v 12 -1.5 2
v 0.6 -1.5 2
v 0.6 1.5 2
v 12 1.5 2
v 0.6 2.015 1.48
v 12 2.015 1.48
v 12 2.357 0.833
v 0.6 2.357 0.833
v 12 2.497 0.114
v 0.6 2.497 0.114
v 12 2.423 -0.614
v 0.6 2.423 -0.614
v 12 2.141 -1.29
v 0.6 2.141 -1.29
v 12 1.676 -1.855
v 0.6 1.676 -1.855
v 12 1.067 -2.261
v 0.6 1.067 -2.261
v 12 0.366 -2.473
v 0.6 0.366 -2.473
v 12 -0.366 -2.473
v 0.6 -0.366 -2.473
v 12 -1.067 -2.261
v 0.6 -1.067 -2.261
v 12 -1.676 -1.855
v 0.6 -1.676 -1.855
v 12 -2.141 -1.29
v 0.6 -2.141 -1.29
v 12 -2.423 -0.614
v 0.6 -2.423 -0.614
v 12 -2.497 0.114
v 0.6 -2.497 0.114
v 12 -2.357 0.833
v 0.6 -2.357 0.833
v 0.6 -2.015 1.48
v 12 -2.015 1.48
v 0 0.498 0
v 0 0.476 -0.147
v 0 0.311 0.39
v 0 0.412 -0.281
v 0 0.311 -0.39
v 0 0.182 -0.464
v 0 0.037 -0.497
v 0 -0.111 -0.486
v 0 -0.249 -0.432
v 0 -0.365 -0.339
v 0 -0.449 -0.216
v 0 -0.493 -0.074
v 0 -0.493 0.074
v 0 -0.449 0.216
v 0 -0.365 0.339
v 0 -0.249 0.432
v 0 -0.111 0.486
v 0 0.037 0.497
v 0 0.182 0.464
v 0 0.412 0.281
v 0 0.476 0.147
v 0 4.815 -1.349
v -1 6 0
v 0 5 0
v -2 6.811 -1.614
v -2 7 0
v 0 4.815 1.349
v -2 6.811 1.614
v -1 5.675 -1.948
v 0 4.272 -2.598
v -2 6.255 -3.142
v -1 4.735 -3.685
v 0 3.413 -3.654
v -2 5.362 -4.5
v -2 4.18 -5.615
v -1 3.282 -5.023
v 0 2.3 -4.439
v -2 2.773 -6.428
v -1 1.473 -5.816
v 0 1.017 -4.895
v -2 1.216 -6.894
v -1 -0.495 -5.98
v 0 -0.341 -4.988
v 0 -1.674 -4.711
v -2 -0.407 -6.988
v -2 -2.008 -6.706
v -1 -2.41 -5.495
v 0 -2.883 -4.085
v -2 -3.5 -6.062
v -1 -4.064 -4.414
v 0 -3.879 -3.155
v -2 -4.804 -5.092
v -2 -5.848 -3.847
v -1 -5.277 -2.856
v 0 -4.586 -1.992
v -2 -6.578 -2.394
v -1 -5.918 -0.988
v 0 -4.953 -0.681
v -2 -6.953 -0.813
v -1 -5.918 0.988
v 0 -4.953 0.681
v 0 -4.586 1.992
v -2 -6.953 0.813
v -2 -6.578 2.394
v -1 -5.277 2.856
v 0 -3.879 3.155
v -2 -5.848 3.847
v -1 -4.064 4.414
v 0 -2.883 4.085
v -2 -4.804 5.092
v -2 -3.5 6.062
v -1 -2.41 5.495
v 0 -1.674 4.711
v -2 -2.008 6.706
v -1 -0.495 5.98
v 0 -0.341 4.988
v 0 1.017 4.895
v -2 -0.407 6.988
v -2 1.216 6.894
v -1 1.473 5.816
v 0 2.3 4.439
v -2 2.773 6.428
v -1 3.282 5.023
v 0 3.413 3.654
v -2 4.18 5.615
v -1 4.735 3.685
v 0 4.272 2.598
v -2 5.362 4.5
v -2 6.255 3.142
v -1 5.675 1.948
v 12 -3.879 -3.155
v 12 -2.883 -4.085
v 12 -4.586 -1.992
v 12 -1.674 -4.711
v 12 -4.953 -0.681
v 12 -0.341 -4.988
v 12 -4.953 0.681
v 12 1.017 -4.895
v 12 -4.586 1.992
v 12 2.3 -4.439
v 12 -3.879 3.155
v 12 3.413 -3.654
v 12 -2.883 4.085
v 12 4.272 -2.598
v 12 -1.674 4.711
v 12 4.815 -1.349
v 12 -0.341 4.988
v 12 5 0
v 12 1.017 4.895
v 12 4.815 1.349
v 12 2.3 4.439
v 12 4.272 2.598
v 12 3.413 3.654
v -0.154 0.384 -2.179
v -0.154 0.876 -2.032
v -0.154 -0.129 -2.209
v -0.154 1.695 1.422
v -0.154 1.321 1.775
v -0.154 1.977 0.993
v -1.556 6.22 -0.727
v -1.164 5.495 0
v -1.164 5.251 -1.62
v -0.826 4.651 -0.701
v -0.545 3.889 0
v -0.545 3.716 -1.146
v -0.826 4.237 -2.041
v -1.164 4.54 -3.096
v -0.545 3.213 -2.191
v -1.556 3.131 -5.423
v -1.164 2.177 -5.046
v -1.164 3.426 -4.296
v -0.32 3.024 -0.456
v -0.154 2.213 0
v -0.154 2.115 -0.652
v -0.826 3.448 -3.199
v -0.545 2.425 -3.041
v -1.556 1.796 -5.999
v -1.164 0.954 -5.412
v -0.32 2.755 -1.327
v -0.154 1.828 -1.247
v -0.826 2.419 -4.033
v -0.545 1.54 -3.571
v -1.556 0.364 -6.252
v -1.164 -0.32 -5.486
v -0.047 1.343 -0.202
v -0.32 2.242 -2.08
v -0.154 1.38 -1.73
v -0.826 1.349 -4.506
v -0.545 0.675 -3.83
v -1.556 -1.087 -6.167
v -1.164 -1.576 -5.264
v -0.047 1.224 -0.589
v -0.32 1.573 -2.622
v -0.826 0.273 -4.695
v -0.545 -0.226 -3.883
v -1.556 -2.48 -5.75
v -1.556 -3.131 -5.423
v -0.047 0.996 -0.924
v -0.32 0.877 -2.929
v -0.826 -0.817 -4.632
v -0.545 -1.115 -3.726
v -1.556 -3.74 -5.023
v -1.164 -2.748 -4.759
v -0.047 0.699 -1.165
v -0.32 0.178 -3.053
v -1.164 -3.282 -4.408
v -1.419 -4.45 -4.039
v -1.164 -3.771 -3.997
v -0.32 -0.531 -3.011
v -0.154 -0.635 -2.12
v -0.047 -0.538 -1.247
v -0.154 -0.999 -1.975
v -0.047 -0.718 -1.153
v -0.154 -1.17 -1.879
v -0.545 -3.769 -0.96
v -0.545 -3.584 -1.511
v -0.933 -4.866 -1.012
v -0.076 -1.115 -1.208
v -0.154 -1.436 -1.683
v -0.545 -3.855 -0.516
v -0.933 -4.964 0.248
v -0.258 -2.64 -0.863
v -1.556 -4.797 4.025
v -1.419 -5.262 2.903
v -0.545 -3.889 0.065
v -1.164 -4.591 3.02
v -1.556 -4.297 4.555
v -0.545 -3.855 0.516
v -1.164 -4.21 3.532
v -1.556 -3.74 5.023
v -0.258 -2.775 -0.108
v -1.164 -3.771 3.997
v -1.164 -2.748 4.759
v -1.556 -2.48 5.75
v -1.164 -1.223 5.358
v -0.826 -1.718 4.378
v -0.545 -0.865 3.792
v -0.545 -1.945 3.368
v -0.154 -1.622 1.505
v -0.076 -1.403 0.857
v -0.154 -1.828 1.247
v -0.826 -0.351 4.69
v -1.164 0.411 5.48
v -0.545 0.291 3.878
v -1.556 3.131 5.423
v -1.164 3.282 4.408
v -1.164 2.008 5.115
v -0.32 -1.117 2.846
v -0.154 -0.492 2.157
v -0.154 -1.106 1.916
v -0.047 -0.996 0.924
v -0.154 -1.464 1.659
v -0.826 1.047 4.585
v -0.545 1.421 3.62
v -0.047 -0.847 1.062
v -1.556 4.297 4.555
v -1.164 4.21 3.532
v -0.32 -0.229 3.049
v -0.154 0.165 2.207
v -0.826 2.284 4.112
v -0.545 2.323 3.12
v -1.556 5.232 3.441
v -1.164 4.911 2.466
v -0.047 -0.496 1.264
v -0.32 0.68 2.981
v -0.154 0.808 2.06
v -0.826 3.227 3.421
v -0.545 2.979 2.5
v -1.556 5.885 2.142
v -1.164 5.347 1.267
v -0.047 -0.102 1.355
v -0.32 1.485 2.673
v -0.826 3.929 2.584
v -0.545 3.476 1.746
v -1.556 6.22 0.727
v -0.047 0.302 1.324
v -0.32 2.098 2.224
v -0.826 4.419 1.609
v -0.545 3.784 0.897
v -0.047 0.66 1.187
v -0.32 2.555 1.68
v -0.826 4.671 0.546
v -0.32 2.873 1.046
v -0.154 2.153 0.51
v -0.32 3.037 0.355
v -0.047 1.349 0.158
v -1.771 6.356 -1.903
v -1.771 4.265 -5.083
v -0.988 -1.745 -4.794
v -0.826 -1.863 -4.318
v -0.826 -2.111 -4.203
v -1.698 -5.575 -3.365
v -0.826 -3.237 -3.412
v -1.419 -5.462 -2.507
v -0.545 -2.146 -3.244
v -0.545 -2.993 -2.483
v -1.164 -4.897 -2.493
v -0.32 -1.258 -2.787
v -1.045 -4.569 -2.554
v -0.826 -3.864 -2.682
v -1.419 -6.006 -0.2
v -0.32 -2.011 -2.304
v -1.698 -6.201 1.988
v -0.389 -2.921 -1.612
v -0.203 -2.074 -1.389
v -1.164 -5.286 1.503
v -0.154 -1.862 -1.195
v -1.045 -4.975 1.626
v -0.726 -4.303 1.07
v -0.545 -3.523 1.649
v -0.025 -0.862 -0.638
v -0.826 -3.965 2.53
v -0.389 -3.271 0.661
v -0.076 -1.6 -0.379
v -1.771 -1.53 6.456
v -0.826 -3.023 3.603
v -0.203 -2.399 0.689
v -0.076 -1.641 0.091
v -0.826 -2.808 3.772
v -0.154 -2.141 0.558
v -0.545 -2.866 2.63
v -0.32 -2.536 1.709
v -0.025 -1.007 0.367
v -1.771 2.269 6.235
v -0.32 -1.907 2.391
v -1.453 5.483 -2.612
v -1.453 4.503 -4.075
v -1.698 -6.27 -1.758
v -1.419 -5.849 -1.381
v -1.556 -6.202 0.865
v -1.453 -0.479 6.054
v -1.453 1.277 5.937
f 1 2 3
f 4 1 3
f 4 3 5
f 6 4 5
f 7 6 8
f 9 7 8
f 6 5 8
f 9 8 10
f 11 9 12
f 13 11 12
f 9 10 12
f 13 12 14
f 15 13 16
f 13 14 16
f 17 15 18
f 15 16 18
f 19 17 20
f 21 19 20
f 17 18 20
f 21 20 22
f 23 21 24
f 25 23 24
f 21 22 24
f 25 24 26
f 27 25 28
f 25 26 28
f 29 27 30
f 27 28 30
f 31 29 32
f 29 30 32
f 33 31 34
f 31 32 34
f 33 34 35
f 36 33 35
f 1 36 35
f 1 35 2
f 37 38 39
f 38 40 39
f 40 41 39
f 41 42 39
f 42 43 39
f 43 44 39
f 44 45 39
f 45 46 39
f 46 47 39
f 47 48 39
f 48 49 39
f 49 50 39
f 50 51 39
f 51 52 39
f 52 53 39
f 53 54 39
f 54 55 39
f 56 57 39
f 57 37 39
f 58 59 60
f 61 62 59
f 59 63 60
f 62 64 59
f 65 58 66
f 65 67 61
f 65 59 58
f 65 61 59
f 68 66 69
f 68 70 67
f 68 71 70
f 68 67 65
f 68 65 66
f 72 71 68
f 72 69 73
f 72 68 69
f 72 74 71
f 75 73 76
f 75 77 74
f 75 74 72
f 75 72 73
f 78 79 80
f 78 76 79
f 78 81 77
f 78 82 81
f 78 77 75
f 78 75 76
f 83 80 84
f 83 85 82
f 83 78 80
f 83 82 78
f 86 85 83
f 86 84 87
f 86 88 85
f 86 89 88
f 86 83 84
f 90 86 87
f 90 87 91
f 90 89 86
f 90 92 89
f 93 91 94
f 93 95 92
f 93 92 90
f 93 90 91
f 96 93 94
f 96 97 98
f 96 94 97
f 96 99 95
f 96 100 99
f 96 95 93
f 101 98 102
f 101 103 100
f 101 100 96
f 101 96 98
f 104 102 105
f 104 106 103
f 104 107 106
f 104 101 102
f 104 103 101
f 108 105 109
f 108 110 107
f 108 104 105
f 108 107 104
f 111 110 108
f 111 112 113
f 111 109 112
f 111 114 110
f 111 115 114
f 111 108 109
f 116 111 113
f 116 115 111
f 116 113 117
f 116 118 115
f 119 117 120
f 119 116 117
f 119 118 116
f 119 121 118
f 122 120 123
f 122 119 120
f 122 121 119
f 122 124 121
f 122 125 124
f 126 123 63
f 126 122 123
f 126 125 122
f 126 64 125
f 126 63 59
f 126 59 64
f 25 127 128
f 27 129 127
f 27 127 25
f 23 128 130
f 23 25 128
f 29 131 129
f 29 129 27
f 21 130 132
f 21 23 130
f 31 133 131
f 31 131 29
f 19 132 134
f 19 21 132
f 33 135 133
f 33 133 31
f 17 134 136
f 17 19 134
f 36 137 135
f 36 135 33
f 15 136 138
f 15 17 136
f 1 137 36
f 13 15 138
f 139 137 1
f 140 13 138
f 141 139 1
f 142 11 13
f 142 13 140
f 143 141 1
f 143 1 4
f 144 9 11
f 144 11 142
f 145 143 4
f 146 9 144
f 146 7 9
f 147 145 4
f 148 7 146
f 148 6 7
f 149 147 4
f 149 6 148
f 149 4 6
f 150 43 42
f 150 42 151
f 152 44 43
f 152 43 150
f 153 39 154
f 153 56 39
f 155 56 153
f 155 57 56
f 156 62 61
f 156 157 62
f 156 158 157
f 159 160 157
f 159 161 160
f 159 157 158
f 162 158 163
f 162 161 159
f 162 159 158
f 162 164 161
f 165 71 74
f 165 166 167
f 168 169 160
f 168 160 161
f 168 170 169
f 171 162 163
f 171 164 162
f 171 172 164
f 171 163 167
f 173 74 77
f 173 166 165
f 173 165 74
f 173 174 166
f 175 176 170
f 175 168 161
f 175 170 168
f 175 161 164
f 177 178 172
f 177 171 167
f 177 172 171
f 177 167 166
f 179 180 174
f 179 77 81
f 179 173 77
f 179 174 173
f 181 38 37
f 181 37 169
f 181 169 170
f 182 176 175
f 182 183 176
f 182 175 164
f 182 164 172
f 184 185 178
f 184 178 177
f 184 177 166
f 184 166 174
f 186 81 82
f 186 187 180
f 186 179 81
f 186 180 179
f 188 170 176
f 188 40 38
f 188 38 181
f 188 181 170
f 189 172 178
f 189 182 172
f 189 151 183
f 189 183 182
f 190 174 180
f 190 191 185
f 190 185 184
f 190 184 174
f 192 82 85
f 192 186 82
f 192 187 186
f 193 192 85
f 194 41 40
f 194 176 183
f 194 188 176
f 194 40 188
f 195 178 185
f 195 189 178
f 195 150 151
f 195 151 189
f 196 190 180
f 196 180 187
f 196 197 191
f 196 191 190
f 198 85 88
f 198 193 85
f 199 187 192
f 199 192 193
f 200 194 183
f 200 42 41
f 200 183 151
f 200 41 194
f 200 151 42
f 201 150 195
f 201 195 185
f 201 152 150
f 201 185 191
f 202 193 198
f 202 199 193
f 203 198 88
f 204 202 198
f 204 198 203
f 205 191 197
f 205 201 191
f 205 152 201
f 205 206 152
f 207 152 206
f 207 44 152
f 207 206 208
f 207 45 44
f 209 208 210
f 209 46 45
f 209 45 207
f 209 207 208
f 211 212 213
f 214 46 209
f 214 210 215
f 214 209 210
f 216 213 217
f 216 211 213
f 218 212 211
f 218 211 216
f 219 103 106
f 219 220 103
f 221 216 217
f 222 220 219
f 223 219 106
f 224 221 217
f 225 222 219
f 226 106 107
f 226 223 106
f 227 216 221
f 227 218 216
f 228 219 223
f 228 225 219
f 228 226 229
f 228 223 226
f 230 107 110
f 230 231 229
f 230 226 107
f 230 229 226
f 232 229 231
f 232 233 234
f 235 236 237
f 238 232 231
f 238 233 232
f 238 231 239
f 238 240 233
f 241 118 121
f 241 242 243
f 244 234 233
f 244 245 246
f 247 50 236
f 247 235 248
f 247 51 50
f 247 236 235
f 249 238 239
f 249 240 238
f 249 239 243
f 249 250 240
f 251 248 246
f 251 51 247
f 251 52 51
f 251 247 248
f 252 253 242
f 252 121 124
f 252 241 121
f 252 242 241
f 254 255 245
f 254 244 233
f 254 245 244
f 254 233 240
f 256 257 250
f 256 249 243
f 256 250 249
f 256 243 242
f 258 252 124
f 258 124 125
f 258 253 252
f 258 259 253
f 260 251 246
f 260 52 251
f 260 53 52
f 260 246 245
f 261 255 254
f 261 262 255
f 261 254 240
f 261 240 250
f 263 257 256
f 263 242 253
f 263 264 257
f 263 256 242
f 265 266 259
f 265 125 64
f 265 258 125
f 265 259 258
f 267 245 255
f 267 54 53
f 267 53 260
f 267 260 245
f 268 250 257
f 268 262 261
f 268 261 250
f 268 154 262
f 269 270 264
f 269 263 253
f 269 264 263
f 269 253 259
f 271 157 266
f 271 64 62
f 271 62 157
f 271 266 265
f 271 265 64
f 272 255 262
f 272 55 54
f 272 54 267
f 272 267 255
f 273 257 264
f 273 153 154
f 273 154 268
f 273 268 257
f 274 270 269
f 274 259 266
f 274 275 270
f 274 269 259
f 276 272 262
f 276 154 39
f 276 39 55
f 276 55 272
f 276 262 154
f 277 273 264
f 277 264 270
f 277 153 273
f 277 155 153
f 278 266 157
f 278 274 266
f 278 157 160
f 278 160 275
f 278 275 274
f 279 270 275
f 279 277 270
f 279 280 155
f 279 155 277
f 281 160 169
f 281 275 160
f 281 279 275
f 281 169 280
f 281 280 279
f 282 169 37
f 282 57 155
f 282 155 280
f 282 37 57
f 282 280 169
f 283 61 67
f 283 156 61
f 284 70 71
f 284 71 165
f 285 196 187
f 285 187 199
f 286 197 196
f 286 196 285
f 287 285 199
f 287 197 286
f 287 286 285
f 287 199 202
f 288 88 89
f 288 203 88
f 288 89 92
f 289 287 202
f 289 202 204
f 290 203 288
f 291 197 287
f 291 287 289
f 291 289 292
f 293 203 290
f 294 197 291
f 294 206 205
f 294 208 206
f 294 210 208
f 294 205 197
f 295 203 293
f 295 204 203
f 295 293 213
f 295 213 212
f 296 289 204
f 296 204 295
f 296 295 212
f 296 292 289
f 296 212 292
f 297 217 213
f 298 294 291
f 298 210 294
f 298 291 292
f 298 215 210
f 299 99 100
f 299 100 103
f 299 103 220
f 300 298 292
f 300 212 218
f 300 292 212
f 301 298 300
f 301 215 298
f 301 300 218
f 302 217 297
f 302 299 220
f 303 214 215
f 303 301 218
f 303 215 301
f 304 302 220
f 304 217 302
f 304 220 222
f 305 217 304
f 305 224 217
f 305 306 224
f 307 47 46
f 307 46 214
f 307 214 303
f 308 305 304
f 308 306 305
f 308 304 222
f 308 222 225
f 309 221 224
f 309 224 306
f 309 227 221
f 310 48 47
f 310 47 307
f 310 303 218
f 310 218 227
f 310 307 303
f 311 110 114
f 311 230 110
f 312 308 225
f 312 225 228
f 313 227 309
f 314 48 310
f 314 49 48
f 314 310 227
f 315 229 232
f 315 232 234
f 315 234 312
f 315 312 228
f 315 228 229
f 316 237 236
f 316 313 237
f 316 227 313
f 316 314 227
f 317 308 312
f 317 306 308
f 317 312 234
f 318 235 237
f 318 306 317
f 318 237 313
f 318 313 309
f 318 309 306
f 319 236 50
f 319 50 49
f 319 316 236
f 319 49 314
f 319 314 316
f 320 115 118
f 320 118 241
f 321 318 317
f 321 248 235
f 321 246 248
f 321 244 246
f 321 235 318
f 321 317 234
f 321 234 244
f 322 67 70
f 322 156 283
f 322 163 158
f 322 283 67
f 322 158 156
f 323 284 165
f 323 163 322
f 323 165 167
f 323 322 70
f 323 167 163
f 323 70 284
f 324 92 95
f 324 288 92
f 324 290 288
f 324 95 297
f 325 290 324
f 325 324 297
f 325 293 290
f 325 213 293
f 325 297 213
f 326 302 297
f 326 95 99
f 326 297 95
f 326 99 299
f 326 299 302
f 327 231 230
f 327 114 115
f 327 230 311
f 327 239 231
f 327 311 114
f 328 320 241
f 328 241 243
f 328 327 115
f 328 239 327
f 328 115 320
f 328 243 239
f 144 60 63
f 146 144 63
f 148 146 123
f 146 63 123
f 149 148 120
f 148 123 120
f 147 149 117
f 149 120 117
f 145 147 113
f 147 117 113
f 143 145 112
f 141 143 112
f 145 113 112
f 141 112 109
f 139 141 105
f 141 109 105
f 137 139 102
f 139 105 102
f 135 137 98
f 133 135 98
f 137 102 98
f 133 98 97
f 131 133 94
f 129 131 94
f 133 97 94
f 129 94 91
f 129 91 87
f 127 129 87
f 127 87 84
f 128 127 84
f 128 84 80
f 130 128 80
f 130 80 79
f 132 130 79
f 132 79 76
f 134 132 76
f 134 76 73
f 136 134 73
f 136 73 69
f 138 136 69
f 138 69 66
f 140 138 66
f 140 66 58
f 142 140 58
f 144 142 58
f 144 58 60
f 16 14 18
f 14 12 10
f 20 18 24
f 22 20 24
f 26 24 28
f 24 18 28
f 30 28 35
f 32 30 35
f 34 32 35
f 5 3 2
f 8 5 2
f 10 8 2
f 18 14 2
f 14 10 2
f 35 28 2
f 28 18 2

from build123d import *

# Parameters (mm, degrees)
F0_R     = 5
F1_DEPTH = 12
F3_R     = 5
F4_DEPTH = 0.6


with BuildPart() as f1:
    # F0 (on Right) → F1 (new body)
    with BuildSketch(Plane.YZ):
        Circle(F0_R)
        with BuildLine():
            ThreePointArc((1.5, 2), (0, -2.5), (-1.5, 2))
            Line((-1.5, 2), (1.5, 2))
        make_face(mode=Mode.SUBTRACT)
    extrude(amount=F1_DEPTH)

    # F3 (on face) → F4 (join)
    with BuildSketch(Plane(origin=(0, 0, 0), x_dir=(0, -1, 0), z_dir=(-1, 0, 0))):
        Circle(F3_R)
    extrude(amount=-F4_DEPTH)

    # F2 (on Top) → F5 (revolve)
    with BuildSketch(Plane.XY):
        with BuildLine():
            Line((0, 0.498465), (0, 5))
            Line((0, 5), (-2, 7))
            ThreePointArc((-2, 7), (-0.544714, 3.889288), (0, 0.498465))
        make_face()
    revolve(axis=Axis((-3.519394, 0, 0), (-1, 0, 0)))


solid = f1.part
